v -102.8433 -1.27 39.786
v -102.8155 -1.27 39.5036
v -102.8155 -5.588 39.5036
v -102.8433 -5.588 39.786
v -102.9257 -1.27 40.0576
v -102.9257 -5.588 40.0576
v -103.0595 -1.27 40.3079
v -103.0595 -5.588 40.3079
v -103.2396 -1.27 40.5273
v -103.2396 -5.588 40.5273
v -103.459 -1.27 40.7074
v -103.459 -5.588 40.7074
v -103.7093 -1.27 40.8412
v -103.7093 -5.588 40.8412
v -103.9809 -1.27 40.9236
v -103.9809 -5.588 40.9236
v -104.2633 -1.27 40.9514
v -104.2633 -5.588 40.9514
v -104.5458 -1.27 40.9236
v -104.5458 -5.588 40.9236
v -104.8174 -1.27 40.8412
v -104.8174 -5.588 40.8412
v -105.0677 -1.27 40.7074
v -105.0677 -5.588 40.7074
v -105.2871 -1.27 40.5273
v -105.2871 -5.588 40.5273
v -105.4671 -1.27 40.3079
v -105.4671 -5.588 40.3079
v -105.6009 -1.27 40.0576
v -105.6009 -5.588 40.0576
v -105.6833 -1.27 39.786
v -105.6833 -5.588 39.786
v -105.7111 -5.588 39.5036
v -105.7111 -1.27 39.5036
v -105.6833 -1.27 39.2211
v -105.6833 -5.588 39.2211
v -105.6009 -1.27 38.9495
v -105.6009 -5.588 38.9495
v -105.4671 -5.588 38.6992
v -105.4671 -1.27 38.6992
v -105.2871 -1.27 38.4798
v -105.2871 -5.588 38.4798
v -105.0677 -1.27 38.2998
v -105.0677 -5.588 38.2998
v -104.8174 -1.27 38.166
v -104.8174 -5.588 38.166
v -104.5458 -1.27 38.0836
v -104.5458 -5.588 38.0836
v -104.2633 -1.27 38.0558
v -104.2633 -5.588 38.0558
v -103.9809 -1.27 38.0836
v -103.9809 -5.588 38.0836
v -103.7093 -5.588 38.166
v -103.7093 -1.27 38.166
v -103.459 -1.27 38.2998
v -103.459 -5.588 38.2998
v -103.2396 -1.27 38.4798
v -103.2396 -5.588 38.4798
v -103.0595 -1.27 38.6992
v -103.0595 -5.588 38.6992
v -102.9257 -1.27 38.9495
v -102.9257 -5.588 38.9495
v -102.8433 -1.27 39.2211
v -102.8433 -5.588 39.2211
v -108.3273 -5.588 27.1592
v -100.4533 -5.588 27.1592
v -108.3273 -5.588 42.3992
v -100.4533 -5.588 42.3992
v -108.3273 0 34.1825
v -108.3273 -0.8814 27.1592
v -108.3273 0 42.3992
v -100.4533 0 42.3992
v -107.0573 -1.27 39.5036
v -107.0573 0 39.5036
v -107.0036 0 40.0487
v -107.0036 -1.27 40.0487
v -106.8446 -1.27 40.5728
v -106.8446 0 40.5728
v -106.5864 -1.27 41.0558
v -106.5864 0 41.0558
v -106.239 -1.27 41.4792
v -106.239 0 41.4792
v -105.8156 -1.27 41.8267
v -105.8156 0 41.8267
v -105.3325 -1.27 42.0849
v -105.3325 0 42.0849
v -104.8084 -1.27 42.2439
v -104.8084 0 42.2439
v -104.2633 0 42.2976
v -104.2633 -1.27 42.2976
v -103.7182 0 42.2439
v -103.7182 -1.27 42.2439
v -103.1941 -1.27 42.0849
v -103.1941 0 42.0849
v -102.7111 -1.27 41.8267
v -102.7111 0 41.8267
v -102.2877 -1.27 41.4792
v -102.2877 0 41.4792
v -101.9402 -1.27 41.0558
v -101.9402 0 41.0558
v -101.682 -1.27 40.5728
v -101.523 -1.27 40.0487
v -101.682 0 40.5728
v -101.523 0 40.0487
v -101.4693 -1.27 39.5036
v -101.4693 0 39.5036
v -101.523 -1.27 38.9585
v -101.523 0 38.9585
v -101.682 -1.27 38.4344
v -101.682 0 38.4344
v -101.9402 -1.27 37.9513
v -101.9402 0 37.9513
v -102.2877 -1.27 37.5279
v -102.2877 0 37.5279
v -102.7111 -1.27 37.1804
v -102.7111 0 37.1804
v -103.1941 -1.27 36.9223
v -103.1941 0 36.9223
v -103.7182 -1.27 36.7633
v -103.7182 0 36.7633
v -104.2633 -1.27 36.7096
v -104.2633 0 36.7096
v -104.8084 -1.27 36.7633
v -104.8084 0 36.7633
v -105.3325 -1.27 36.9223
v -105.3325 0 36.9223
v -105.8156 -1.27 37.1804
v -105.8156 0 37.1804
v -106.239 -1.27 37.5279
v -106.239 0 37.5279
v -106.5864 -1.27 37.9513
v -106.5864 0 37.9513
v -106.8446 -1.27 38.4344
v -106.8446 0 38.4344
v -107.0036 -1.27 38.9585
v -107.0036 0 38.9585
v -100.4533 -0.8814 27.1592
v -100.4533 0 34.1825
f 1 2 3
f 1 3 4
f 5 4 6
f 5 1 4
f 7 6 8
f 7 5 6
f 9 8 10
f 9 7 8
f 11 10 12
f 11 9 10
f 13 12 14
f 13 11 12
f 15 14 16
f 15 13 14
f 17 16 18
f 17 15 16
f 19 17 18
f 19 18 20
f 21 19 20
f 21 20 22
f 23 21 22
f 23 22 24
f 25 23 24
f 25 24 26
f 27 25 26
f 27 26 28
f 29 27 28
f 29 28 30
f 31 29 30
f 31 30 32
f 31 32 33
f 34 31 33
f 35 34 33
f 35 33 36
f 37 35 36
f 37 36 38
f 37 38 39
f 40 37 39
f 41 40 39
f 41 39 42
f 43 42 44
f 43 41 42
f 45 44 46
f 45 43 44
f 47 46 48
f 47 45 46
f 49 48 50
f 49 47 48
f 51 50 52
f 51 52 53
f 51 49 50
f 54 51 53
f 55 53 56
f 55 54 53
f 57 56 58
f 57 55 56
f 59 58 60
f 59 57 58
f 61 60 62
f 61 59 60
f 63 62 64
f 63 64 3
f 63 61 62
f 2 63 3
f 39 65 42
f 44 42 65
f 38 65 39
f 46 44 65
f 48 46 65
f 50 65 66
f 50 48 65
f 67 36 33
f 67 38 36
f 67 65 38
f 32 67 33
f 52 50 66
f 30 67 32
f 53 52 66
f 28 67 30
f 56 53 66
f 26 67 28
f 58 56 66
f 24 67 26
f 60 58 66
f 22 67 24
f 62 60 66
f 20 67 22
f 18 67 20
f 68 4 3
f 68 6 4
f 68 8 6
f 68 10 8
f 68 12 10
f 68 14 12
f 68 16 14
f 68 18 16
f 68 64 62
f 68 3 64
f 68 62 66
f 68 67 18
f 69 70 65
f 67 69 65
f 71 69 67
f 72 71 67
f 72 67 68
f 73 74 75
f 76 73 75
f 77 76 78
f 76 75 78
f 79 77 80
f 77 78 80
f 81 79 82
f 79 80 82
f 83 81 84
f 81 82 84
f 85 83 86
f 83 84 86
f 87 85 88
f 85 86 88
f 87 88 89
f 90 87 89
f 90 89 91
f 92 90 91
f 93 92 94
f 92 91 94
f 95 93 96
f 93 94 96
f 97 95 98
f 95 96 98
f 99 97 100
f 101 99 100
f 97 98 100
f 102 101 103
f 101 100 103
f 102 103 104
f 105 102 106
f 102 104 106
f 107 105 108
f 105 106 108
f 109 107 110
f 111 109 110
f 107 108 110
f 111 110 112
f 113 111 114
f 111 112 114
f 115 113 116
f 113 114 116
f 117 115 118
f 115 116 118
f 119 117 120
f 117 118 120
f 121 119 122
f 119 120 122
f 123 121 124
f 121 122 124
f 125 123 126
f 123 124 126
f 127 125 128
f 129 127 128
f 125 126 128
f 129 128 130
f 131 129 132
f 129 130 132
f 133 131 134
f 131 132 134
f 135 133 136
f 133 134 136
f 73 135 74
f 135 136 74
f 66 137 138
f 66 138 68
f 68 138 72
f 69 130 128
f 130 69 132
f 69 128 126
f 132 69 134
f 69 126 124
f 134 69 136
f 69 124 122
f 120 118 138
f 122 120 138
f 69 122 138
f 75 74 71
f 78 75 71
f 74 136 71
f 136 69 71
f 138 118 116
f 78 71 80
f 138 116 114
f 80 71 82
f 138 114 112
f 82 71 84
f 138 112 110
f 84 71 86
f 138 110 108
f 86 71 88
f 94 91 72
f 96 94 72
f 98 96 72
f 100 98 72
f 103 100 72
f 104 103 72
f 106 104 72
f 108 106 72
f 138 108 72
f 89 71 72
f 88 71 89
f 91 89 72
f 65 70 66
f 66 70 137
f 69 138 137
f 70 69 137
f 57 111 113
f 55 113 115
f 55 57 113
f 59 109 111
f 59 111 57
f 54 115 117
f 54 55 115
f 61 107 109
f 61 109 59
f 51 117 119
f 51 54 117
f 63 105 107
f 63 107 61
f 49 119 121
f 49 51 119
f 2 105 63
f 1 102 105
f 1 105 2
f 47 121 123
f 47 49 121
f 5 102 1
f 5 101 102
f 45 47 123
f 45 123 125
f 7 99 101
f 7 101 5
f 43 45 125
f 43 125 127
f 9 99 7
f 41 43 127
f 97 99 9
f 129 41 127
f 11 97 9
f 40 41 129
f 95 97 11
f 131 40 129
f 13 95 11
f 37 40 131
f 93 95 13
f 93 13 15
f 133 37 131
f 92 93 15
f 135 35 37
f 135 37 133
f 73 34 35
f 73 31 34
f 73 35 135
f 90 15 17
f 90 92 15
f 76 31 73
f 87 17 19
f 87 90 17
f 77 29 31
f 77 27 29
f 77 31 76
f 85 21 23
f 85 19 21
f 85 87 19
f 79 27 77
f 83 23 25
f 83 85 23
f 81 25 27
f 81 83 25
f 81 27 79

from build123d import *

# Parameters (mm, degrees)
F0_W     = 7.874
F0_H     = 15.24
F0_R     = 1.4478
F1_DEPTH = 5.588
F2_R     = 2.794
F3_DEPTH = 1.27
F5_DEPTH = 25.4


# Not quite as in the source:
# - a feature names something its author has since deleted; it is built from what else it names


with BuildPart() as f1:
    # F0 (on Front) → F1 (new body)
    with BuildSketch(Plane.XZ):
        with Locations((-104.3903227065, 34.7791743618)):
            Rectangle(F0_W, F0_H)
        with Locations((-104.2633227065, 39.5035743618)):
            Circle(F0_R, mode=Mode.SUBTRACT)
    extrude(amount=F1_DEPTH)

    # F2 (on face) → F3 (cut)
    with BuildSketch(Plane(origin=(0, 0, 0), x_dir=(-1, 0, 0), z_dir=(0, 1, 0))):
        with Locations((104.2633227065, 39.5035743618)):
            Circle(F2_R)
    extrude(amount=-F3_DEPTH, mode=Mode.SUBTRACT)

    # F4 (on face) → F5 (cut)
    with BuildSketch(Plane.YZ.offset(-100.4533227065)):
        Polygon((0, 34.1825485229), (-0.8814302273, 27.1591743618), (0, 27.1591743618), align=None)
    extrude(amount=-F5_DEPTH, mode=Mode.SUBTRACT)


solid = f1.part
